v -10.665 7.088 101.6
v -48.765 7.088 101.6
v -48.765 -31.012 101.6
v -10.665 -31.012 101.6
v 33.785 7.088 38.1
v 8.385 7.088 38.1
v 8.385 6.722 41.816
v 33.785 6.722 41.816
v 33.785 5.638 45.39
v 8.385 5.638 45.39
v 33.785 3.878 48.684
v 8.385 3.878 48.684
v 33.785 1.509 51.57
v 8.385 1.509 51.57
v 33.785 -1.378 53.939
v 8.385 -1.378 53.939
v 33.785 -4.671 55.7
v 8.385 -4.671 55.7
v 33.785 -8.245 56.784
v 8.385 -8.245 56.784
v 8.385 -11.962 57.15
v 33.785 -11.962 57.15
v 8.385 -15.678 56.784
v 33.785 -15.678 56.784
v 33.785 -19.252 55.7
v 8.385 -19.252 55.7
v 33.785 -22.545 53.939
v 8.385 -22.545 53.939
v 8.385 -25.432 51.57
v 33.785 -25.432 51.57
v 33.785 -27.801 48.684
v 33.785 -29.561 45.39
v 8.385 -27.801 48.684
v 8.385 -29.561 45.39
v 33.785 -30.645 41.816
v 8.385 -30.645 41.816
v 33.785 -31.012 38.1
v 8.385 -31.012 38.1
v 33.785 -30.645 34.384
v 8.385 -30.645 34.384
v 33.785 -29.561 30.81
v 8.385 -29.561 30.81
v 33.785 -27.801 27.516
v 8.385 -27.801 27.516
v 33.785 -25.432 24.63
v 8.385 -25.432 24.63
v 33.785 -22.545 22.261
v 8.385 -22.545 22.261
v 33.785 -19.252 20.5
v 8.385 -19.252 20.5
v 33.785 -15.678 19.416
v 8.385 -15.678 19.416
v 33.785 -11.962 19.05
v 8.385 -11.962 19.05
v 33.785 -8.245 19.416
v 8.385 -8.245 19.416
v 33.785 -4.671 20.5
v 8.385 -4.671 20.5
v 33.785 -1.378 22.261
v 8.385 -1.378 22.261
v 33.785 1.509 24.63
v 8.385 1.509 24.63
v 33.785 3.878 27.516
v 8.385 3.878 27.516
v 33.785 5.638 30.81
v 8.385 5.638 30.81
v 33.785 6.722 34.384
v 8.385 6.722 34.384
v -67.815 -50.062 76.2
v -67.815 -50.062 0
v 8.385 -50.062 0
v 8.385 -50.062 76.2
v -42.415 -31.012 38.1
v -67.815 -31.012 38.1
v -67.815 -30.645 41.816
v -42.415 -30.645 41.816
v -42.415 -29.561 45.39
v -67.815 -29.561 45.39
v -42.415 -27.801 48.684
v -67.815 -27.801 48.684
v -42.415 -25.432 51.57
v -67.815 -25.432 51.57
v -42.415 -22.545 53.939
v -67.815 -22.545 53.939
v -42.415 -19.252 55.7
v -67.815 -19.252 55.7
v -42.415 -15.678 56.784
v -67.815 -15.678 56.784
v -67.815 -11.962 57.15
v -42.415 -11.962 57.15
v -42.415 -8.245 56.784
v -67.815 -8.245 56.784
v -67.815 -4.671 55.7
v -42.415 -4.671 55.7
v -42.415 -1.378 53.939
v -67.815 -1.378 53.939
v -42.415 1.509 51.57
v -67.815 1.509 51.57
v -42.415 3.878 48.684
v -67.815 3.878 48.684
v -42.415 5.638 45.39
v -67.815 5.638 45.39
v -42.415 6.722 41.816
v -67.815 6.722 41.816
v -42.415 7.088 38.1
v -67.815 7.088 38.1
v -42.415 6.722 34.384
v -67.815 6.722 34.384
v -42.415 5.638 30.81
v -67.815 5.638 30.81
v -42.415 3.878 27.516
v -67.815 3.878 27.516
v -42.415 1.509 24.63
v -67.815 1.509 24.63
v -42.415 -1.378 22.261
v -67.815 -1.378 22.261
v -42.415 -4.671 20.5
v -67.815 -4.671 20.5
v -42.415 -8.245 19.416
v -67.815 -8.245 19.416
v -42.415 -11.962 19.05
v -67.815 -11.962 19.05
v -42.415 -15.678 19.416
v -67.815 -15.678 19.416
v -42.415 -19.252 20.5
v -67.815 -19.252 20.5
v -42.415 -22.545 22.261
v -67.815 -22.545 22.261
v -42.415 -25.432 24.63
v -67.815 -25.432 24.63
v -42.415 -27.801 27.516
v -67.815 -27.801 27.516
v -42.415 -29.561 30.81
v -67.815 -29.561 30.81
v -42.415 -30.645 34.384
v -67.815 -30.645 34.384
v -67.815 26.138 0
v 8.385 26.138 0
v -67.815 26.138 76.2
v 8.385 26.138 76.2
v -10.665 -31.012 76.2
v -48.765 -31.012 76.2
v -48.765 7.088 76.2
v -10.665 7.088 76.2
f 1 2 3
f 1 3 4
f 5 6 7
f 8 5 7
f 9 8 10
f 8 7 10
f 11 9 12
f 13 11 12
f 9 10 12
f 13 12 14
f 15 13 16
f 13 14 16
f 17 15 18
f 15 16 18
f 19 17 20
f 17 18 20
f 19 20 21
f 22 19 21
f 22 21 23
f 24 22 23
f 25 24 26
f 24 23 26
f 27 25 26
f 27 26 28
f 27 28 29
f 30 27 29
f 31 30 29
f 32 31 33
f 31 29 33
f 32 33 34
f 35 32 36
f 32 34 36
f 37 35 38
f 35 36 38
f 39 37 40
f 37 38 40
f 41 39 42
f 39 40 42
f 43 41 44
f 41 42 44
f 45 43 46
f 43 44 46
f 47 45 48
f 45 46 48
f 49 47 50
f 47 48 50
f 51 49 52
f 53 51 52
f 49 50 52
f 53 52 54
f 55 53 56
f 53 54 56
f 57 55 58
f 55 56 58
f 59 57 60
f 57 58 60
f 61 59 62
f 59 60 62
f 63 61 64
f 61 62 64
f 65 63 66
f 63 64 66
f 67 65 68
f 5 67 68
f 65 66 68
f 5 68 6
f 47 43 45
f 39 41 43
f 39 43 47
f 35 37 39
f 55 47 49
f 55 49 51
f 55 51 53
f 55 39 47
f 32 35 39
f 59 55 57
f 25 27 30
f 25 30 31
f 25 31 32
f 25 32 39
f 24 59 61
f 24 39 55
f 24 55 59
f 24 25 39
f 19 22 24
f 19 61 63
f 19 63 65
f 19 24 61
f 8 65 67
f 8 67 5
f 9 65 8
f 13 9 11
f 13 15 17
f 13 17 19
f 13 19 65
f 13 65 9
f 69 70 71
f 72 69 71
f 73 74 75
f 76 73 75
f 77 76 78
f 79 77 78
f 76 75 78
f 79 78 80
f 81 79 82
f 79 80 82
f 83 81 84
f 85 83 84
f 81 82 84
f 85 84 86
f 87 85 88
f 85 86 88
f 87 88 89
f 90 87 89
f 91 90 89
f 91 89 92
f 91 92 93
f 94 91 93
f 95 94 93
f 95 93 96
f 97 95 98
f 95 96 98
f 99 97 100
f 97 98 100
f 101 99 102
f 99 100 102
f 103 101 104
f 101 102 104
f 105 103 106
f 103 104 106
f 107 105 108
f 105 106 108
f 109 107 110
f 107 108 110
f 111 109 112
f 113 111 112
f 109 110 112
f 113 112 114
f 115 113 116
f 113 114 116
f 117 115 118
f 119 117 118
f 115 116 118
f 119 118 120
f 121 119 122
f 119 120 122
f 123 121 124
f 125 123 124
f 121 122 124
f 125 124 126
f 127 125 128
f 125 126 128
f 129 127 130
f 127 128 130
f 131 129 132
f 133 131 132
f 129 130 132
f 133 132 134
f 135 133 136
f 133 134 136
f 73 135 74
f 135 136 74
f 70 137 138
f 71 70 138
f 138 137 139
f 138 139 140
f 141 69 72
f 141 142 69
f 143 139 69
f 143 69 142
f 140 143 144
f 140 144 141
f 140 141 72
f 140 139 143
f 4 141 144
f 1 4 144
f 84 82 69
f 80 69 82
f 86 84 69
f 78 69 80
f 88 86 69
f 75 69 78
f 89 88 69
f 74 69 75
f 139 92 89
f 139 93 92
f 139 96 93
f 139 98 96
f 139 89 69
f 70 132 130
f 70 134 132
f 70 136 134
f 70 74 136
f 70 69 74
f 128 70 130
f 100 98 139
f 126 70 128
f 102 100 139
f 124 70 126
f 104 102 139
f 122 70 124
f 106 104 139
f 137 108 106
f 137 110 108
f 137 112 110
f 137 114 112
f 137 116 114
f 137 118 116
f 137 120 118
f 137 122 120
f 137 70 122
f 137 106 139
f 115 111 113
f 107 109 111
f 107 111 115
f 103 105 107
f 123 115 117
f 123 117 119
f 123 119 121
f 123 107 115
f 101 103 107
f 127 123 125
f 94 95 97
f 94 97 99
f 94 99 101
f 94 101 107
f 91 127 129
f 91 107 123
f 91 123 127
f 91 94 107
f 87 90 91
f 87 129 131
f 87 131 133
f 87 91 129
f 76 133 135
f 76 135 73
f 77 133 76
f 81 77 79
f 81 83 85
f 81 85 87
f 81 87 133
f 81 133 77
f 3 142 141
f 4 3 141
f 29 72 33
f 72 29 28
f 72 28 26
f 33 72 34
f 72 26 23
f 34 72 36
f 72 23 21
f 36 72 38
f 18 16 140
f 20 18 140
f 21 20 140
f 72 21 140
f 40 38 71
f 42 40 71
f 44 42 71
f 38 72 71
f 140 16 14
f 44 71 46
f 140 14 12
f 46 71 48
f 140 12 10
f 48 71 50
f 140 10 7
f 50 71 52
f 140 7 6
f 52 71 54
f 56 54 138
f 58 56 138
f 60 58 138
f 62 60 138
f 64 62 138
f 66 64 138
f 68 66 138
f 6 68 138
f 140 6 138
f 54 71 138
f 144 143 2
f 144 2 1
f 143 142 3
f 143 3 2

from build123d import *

# Parameters (mm, degrees)
F0_W     = 76.2
F0_H     = 76.2
F1_DEPTH = 76.2
F2_W     = 38.1
F2_H     = 38.1
F5_DEPTH = 25.4
F3_R     = 19.05
F6_DEPTH = 25.4
F4_R     = 19.05
F7_DEPTH = 25.4


with BuildPart() as f1:
    # F0 (on Top) → F1 (new body)
    with BuildSketch(Plane.XY):
        with Locations((-29.714826, -11.961539)):
            Rectangle(F0_W, F0_H)
    extrude(amount=F1_DEPTH)

    # F2 (on face) → F5 (join)
    with BuildSketch(Plane.XY.offset(76.2)):
        with Locations((-29.714826, -11.961539)):
            Rectangle(F2_W, F2_H)
    extrude(amount=F5_DEPTH)

    # F3 (on face) → F6 (join)
    with BuildSketch(Plane.YZ.offset(8.385174)):
        with Locations((-11.961539, 38.1)):
            Circle(F3_R)
    extrude(amount=F6_DEPTH)

    # F4 (on face) → F7 (cut)
    with BuildSketch(Plane(origin=(-67.814826, 0, 0), x_dir=(0, -1, 0), z_dir=(-1, 0, 0))):
        with Locations((11.961539, 38.1)):
            Circle(F4_R)
    extrude(amount=-F7_DEPTH, mode=Mode.SUBTRACT)


solid = f1.part
